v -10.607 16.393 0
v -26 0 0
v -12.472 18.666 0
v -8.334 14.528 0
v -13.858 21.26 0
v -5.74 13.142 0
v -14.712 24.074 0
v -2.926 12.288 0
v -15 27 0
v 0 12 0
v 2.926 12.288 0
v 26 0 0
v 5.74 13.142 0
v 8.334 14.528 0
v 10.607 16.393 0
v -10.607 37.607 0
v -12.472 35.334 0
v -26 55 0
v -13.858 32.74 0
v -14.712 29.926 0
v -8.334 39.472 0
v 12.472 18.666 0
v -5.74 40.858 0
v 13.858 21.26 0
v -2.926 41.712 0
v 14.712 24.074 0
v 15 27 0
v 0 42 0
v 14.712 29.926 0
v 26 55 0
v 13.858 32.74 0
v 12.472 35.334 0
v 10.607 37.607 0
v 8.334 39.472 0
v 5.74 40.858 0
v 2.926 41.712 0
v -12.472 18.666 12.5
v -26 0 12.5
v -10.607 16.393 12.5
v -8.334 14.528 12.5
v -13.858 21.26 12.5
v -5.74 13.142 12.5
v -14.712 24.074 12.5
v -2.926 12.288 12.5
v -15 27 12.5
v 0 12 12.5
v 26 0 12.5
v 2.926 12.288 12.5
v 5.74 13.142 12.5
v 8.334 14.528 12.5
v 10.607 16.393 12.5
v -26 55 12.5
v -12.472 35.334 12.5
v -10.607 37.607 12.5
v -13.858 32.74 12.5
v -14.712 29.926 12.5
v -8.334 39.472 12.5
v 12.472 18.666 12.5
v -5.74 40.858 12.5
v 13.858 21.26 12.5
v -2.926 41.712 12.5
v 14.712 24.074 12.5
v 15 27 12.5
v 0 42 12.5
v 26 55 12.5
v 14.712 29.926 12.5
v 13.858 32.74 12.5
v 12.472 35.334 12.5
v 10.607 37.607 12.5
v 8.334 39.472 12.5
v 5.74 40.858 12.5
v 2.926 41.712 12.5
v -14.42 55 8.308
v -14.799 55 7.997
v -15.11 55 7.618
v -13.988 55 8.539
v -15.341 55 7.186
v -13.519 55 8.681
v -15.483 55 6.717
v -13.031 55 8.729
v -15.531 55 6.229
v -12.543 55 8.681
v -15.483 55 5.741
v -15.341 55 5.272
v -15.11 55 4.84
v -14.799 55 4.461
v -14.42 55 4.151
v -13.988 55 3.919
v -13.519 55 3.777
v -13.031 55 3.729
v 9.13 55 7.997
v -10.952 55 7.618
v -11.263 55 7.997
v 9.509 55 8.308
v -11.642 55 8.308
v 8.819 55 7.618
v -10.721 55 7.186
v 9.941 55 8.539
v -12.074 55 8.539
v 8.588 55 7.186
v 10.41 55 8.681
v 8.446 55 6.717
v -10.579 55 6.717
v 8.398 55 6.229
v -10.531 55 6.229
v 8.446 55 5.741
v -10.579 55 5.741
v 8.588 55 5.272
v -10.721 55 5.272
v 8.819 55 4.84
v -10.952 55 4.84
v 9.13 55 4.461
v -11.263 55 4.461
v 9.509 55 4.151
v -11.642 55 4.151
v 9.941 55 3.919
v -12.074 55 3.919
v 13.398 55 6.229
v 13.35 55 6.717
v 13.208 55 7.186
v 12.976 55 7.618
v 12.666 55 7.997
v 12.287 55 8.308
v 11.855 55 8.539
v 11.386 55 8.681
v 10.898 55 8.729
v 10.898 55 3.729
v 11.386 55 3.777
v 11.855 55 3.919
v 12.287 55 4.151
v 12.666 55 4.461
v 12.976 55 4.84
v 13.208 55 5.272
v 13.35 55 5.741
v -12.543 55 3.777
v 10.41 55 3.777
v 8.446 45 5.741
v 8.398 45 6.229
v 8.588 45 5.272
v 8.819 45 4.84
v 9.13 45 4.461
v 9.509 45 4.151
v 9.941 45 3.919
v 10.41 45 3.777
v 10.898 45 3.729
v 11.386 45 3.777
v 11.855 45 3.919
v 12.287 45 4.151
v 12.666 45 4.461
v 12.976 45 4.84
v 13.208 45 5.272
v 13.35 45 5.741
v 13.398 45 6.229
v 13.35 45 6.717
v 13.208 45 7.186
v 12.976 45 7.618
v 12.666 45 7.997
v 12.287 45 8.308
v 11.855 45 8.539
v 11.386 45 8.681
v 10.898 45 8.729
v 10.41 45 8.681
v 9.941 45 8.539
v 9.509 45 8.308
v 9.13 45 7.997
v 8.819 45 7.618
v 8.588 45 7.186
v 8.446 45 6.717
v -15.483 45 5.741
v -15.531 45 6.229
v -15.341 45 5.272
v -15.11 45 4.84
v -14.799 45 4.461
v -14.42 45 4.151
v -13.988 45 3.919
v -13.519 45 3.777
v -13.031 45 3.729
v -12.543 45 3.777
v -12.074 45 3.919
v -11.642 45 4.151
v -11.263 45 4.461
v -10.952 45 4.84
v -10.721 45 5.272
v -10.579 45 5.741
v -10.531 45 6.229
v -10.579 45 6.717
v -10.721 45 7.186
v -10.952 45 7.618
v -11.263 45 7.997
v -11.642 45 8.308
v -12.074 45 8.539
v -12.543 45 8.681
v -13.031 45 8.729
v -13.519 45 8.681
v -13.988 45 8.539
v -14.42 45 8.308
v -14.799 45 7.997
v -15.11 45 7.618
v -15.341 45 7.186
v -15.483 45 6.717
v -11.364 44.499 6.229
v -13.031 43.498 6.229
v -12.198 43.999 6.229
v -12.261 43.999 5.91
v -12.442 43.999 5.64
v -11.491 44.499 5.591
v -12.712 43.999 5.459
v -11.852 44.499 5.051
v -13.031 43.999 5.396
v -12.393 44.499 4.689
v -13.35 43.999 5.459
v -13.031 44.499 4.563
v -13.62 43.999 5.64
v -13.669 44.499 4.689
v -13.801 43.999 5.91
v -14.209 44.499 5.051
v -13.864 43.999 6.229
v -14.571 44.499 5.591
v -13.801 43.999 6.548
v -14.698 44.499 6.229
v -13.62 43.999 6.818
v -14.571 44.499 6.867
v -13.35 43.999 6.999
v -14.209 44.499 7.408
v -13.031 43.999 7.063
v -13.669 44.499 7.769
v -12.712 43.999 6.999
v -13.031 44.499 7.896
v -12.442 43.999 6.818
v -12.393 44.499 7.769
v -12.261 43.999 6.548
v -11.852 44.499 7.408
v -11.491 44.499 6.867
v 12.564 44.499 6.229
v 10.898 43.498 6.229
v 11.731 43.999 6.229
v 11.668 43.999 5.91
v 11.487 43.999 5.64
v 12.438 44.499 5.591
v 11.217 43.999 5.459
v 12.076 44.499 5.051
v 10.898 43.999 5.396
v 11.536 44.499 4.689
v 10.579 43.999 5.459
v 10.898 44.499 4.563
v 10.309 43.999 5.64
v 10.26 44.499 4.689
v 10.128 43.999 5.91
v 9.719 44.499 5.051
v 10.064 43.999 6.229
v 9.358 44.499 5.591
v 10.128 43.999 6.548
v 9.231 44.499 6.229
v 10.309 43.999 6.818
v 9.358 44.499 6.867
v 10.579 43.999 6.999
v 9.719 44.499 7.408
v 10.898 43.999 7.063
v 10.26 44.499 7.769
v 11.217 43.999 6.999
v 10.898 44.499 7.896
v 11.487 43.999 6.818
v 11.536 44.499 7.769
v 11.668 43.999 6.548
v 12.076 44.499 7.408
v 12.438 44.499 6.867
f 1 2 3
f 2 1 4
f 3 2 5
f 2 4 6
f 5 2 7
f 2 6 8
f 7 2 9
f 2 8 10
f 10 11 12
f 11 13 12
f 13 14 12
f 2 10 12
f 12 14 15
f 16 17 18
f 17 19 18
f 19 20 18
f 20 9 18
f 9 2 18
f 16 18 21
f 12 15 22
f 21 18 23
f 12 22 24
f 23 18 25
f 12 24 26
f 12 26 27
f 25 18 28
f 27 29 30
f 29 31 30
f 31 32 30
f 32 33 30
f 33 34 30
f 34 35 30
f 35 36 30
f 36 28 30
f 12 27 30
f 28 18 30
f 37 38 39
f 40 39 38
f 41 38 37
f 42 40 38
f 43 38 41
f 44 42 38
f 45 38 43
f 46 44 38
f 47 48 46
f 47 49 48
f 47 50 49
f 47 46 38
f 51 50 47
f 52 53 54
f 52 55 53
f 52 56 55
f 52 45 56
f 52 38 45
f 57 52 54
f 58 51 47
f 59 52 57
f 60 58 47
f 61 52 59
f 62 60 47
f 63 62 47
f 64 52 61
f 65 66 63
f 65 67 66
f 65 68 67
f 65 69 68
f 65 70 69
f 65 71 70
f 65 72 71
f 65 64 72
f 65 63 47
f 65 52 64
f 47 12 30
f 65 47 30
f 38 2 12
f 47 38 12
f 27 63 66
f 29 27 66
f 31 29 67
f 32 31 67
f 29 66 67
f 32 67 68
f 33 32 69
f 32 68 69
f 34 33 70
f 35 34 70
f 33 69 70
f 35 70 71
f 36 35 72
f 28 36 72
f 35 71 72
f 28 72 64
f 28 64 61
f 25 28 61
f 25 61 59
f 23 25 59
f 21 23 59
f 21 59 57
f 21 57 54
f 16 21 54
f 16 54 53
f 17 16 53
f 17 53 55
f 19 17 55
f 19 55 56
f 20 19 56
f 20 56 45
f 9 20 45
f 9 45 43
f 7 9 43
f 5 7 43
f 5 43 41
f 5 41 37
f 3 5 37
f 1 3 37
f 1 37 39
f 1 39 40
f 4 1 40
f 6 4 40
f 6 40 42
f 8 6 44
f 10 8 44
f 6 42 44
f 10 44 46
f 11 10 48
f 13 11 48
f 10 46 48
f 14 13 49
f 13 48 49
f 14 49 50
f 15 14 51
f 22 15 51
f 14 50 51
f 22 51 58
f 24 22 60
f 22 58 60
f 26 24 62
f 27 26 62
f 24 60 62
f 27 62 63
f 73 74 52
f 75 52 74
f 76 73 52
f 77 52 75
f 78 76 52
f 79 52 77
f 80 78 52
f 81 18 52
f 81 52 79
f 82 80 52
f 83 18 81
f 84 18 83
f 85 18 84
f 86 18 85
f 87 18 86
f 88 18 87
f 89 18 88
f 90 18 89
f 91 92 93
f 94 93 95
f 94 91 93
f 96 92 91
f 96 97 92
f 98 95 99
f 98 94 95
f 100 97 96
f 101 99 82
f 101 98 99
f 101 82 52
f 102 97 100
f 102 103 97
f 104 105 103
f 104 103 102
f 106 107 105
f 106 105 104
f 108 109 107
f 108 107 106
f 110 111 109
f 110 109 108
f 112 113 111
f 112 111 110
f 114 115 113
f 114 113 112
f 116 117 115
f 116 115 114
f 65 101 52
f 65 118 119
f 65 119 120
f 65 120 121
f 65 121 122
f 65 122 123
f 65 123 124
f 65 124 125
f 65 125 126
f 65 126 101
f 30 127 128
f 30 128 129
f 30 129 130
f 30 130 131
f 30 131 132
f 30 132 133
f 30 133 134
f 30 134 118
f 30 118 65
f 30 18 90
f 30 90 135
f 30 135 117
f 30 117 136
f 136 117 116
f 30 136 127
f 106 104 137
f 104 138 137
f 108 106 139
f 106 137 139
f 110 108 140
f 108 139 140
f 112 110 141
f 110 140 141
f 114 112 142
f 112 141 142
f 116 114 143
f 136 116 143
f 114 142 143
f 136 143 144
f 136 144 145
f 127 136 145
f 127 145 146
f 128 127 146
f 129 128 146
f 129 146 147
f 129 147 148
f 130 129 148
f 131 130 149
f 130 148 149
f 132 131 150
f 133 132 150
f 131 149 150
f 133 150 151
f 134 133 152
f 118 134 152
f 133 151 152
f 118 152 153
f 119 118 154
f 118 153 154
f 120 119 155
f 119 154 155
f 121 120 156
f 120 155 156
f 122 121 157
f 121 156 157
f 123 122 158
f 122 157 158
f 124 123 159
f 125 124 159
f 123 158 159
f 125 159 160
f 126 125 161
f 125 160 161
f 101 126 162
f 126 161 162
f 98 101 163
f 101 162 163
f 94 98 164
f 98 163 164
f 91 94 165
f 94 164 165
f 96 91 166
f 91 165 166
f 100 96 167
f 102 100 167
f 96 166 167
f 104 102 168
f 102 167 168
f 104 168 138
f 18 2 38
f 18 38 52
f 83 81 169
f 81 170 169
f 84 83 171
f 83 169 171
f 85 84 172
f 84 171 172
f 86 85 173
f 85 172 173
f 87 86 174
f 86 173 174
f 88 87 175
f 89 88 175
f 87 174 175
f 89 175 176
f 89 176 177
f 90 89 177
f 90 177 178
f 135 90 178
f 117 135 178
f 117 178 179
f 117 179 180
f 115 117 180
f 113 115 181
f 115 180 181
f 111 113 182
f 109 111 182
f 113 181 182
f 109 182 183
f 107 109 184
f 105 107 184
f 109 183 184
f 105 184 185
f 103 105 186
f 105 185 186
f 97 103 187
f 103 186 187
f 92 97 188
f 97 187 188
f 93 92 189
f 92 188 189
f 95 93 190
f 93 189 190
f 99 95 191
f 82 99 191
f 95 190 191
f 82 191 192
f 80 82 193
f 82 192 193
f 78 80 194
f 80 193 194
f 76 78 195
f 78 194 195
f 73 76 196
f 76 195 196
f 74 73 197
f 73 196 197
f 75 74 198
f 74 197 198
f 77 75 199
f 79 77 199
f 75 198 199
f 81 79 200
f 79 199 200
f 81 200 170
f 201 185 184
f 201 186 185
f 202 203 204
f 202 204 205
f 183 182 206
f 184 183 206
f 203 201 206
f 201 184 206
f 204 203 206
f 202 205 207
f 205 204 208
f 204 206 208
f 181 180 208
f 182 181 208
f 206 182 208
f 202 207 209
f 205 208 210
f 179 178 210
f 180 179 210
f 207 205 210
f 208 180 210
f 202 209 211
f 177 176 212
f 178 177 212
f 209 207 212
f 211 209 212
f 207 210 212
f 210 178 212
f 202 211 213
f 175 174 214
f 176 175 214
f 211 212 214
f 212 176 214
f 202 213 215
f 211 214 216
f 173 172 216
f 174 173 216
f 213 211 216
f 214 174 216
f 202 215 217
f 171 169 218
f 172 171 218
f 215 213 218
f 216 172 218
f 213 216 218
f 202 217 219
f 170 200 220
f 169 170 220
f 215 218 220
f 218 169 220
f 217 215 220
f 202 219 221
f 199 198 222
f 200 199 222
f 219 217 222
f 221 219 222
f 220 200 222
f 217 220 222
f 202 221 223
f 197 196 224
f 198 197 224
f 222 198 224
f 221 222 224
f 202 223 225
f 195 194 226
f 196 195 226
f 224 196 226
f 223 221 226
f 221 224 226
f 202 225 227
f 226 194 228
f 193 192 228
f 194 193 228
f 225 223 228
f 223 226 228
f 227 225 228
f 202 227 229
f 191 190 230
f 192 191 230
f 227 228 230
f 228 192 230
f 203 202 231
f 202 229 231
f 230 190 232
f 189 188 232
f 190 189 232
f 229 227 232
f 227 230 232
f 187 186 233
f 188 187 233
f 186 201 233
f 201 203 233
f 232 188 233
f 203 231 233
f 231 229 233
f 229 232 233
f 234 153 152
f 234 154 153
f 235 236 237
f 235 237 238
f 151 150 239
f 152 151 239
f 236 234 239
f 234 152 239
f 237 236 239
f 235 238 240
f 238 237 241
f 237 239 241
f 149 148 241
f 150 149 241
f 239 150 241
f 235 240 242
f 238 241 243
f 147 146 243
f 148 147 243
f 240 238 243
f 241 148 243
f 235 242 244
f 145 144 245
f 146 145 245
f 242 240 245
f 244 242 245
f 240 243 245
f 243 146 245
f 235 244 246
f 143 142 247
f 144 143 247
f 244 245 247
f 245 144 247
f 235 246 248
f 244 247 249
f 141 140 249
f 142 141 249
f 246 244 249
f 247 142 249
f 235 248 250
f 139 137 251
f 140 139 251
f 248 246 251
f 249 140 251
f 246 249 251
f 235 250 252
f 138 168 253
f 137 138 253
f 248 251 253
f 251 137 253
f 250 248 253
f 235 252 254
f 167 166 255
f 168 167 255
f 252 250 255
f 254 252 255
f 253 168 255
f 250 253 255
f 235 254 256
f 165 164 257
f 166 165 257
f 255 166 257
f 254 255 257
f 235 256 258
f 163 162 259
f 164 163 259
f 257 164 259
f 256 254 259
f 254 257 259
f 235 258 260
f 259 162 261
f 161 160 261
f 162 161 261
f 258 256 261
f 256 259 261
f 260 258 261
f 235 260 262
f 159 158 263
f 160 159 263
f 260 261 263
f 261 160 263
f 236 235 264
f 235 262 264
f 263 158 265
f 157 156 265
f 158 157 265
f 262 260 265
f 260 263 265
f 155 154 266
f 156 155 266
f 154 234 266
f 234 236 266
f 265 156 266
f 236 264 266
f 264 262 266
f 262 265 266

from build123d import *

# Parameters (mm, degrees)
SKETCH1_W                 = 52
SKETCH1_H                 = 55
BOSS_EXTRUDE1_DEPTH       = 12.5
SKETCH2_R                 = 15
CUT_EXTRUDE2_DEPTH        = 13.5
F_5_0MM_DOWEL_HOLE1_D     = 5
F_5_0MM_DOWEL_HOLE1_DEPTH = 10
F_5_0MM_DOWEL_HOLE1_TIP   = 1.502151548


with BuildPart() as part:
    # Sketch1 → Boss-Extrude1 (new body)
    with BuildSketch(Plane.XY):
        with Locations((0, 27.5)):
            Rectangle(SKETCH1_W, SKETCH1_H)
    extrude(amount=BOSS_EXTRUDE1_DEPTH)

    # Sketch2 → Cut-Extrude2 (cut, through all)
    with BuildSketch(Plane.XY.offset(12.5)):
        with Locations((0, 27)):
            Circle(SKETCH2_R)
    extrude(amount=-CUT_EXTRUDE2_DEPTH, mode=Mode.SUBTRACT)

    # Ø5.0mm Dowel Hole1
    with Locations(Plane(origin=(0, 55, 0), x_dir=(1, 0, 0), z_dir=(0, 1, 0))):
        with Locations((-13.030851483, -6.229198753), (10.897813178, -6.229198753)):
            Hole(F_5_0MM_DOWEL_HOLE1_D / 2, depth=F_5_0MM_DOWEL_HOLE1_DEPTH)
            with Locations((0, 0, -(F_5_0MM_DOWEL_HOLE1_DEPTH + F_5_0MM_DOWEL_HOLE1_TIP / 2))):  # 118° drill point
                Cone(0, F_5_0MM_DOWEL_HOLE1_D / 2, F_5_0MM_DOWEL_HOLE1_TIP, mode=Mode.SUBTRACT)


solid = part.part
